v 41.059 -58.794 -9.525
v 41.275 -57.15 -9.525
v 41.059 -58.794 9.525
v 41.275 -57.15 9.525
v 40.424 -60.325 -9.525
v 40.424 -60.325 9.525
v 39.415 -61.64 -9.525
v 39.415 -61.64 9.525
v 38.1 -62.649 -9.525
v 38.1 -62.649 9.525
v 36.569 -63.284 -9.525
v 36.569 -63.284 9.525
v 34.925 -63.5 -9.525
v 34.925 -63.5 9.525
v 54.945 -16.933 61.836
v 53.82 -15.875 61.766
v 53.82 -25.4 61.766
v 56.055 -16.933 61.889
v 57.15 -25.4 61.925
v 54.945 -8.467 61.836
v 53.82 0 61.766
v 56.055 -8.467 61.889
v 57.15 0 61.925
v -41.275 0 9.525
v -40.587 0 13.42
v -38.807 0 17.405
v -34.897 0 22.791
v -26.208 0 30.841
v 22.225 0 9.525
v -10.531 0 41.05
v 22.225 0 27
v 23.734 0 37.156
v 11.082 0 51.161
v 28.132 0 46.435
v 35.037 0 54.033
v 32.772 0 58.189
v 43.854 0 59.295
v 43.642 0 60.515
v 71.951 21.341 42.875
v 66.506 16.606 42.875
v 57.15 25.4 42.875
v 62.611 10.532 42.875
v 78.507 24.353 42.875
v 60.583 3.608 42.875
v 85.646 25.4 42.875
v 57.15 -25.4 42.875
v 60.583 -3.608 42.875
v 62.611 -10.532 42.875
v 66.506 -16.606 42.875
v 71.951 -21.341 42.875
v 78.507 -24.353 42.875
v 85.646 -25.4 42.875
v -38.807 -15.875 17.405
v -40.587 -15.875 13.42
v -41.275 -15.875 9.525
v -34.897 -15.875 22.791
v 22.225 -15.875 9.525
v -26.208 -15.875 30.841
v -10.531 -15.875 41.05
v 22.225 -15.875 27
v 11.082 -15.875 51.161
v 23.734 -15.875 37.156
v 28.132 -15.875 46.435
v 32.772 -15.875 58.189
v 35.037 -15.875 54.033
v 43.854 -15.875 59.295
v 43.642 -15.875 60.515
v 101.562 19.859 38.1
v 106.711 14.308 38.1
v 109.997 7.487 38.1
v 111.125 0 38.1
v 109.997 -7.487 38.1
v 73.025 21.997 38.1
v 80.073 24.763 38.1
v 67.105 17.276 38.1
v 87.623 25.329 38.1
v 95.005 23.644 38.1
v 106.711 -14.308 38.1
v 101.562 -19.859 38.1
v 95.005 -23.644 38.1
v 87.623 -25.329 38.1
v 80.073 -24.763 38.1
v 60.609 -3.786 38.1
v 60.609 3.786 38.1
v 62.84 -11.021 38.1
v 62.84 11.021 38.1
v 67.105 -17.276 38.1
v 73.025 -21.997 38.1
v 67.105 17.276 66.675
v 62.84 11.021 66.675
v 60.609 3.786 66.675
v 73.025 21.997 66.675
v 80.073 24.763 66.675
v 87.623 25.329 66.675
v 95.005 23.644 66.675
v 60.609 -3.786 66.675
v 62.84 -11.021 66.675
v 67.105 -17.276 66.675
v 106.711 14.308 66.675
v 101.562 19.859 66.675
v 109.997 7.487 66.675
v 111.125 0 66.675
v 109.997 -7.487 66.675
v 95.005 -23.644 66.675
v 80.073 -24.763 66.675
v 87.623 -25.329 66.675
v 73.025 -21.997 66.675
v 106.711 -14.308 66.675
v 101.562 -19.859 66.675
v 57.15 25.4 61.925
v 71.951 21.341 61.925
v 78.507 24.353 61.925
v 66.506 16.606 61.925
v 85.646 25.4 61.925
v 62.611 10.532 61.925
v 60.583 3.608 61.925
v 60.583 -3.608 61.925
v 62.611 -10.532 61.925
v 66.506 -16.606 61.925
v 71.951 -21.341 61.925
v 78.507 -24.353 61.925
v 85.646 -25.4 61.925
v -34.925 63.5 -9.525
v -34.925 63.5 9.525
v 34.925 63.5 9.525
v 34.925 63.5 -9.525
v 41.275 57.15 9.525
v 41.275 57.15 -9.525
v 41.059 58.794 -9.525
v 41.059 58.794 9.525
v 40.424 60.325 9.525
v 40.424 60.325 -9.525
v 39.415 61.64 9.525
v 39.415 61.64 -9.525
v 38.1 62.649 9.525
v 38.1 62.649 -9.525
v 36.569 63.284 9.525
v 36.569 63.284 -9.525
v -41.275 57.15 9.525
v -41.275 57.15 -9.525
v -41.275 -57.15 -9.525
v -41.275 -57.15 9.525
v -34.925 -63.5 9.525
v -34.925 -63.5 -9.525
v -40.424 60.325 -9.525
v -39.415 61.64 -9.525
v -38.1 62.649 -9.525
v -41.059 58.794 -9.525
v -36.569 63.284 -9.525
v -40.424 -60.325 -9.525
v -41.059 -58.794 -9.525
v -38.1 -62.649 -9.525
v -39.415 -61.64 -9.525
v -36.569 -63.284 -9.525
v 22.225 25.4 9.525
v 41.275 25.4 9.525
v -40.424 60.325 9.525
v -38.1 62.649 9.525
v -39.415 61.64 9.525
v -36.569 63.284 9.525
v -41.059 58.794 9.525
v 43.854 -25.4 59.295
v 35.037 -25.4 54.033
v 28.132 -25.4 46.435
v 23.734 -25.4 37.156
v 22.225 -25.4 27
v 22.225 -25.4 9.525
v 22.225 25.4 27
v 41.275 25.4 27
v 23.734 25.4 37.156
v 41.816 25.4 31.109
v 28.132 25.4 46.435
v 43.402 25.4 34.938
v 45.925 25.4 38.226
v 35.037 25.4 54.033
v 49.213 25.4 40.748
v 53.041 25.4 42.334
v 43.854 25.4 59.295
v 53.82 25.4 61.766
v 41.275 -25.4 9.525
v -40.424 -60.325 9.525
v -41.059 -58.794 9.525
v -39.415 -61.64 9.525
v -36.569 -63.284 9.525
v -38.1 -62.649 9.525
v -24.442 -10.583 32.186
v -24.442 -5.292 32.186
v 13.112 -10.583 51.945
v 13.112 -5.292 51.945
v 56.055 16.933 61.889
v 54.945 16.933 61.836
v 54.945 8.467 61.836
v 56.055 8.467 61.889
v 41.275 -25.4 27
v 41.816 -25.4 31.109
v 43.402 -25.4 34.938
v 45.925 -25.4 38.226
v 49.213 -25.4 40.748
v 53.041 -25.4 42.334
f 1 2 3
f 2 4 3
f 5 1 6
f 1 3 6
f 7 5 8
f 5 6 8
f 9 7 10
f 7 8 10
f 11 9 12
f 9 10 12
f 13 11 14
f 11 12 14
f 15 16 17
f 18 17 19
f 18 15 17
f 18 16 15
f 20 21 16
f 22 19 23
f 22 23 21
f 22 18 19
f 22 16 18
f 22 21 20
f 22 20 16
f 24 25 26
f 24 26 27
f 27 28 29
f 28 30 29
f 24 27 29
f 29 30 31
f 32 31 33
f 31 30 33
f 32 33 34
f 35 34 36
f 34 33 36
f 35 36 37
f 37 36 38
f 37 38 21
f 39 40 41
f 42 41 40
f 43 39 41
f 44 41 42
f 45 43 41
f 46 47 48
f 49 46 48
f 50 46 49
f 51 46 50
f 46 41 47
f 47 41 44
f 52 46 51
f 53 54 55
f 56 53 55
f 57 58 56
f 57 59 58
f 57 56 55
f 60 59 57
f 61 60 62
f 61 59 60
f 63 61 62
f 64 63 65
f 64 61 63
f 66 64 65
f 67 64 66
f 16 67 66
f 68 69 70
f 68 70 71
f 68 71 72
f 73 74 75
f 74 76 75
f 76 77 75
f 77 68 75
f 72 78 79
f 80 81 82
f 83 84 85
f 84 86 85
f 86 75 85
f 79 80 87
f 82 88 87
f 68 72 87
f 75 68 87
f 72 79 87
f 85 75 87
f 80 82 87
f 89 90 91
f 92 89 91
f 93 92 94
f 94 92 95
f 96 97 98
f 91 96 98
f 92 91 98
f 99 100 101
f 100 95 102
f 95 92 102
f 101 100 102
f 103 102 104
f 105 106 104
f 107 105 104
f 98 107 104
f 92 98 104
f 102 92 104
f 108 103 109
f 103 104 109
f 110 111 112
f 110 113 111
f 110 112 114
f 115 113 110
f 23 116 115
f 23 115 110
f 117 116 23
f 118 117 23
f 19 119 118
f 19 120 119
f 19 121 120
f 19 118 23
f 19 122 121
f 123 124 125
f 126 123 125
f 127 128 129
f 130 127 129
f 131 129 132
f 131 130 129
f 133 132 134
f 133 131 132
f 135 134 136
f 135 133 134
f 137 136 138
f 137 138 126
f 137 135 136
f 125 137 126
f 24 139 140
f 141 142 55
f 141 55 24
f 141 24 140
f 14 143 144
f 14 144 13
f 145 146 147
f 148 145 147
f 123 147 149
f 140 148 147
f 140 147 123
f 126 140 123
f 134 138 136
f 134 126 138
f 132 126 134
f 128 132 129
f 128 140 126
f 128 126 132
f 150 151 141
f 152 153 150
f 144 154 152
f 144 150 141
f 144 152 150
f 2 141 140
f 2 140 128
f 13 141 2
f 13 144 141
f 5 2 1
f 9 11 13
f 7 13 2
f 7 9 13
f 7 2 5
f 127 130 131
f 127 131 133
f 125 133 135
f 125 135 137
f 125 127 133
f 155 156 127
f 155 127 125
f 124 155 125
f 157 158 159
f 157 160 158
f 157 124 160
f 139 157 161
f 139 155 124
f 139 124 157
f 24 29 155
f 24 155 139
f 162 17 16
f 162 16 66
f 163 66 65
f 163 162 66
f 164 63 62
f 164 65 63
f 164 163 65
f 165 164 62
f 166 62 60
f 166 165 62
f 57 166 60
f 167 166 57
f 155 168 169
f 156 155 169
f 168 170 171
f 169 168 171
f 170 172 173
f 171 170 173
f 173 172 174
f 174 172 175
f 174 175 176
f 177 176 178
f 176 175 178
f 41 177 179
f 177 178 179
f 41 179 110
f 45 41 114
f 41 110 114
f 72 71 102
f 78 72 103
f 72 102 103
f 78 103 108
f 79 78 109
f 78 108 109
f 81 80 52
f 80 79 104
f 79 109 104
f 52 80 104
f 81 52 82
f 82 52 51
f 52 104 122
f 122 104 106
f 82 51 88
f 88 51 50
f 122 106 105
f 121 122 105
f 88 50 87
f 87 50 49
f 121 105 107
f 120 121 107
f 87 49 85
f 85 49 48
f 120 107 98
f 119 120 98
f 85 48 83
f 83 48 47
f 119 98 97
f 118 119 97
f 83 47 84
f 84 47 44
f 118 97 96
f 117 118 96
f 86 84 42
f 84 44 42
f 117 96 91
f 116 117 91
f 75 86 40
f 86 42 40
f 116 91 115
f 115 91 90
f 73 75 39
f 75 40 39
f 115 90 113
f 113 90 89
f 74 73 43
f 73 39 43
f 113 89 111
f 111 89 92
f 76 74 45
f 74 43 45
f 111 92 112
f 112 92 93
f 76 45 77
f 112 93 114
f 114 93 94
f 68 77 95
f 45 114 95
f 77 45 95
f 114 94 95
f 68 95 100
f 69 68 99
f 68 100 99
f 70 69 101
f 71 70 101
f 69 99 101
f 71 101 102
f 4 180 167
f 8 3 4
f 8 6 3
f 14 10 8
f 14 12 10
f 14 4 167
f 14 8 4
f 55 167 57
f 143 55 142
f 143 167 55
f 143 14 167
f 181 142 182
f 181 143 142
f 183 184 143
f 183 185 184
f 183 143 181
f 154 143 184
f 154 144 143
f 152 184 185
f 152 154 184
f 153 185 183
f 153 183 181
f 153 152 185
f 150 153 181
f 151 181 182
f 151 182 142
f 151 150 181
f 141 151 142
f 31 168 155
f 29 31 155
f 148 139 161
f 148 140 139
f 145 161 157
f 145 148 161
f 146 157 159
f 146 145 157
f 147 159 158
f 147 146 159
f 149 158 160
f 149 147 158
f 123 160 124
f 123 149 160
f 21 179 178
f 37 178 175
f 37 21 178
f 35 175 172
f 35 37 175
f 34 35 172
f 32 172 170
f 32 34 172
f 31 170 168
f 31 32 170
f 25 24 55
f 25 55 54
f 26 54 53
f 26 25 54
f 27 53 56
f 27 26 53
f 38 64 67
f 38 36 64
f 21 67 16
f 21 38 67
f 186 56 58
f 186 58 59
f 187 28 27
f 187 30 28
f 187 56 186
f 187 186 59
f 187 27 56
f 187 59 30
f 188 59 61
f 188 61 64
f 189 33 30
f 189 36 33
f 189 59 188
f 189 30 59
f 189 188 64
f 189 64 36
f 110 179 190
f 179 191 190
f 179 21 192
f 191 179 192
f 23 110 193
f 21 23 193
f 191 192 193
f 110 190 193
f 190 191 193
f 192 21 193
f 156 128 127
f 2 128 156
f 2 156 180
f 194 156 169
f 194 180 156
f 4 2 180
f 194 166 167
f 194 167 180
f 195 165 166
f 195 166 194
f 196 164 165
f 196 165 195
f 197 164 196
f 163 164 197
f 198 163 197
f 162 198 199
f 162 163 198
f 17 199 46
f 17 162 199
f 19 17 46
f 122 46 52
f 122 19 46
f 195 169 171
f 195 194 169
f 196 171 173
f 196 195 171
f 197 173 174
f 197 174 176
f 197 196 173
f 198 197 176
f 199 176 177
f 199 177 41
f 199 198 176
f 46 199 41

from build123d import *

# Parameters (mm, degrees)
F1_DEPTH = 63.5
F0_W     = 25.3211855178
F0_H     = 19.05
F2_DEPTH = 25.4
F3_DEPTH = 15.875
F5_R     = 6.35


with BuildPart() as f1:
    # F0 (on Front) → F1 (new body, symmetric)
    with BuildSketch(Plane.XZ):
        Polygon((41.275, -9.525), (41.275, 9.525), (22.225, 9.525), (-41.275, 9.525), (-41.275, -9.525), align=None)
    extrude(amount=F1_DEPTH, both=True)

    # F0 (on Front) → F2 (join, symmetric)
    with BuildSketch(Plane.XZ):
        with Locations((72.9855927589, 52.4002)):
            Rectangle(F0_W, F0_H)
        with BuildLine():
            Line((22.225, 9.525), (41.275, 9.525))
            Line((41.275, 9.525), (41.275, 27.0002))
            ThreePointArc((41.275, 27.0002), (45.9246798487, 38.2255201513), (57.15, 42.8752))
            Line((57.15, 42.8752), (60.325, 42.8752))
            Line((60.325, 42.8752), (60.325, 61.9252))
            Line((60.325, 61.9252), (57.15, 61.9252))
            add(Edge.make_bspline(
                [(53.8199176635, 61.7660766125), (54.9516006508, 61.8440010886), (56.0624181193, 61.8973585375), (57.15, 61.9252)],
                knots=[108.144944826, 108.144944826, 108.144944826, 108.144944826, 111.5045361635, 111.5045361635, 111.5045361635, 111.5045361635], degree=3))
            ThreePointArc((53.8199176635, 61.7660766125), (31.3037357574, 50.4890537332), (22.225, 27.0002))
            Line((22.225, 27.0002), (22.225, 9.525))
        make_face()
    extrude(amount=F2_DEPTH, both=True)

    # F0 (on Front) → F3 (join)
    with BuildSketch(Plane.XZ):
        with BuildLine():
            Line((-41.275, 9.525), (22.225, 9.525))
            Line((22.225, 9.525), (22.225, 27.0002))
            ThreePointArc((22.225, 27.0002), (31.3037357574, 50.4890537332), (53.8199176635, 61.7660766125))
            add(Edge.make_bspline(
                [(-41.275, 9.525), (-40.6582798871, 31.2931964034), (17.3911434687, 59.2576946918), (53.8199176635, 61.7660766125)],
                knots=[0, 0, 0, 0, 108.144944826, 108.144944826, 108.144944826, 108.144944826], degree=3))
        make_face()
    extrude(amount=F3_DEPTH)

    # F0 (on Front) → F4 (revolve)
    with BuildSketch(Plane.XZ):
        Polygon((85.725, 52.3875), (85.725, 38.1), (111.125, 38.1), (111.125, 66.675), (85.725, 66.675), align=None)
    revolve(axis=Axis((85.725, 0, 52.3875), (0, 0, -1)))

    # F5
    f5_edges = [f1.edges().sort_by_distance(p)[0] for p in [
        (41.275, 63.5, 0),
        (-41.275, 63.5, 0),
        (41.275, -63.5, 0),
        (-41.275, -63.5, 0),
    ]]
    fillet(f5_edges, radius=F5_R)


solid = f1.part
